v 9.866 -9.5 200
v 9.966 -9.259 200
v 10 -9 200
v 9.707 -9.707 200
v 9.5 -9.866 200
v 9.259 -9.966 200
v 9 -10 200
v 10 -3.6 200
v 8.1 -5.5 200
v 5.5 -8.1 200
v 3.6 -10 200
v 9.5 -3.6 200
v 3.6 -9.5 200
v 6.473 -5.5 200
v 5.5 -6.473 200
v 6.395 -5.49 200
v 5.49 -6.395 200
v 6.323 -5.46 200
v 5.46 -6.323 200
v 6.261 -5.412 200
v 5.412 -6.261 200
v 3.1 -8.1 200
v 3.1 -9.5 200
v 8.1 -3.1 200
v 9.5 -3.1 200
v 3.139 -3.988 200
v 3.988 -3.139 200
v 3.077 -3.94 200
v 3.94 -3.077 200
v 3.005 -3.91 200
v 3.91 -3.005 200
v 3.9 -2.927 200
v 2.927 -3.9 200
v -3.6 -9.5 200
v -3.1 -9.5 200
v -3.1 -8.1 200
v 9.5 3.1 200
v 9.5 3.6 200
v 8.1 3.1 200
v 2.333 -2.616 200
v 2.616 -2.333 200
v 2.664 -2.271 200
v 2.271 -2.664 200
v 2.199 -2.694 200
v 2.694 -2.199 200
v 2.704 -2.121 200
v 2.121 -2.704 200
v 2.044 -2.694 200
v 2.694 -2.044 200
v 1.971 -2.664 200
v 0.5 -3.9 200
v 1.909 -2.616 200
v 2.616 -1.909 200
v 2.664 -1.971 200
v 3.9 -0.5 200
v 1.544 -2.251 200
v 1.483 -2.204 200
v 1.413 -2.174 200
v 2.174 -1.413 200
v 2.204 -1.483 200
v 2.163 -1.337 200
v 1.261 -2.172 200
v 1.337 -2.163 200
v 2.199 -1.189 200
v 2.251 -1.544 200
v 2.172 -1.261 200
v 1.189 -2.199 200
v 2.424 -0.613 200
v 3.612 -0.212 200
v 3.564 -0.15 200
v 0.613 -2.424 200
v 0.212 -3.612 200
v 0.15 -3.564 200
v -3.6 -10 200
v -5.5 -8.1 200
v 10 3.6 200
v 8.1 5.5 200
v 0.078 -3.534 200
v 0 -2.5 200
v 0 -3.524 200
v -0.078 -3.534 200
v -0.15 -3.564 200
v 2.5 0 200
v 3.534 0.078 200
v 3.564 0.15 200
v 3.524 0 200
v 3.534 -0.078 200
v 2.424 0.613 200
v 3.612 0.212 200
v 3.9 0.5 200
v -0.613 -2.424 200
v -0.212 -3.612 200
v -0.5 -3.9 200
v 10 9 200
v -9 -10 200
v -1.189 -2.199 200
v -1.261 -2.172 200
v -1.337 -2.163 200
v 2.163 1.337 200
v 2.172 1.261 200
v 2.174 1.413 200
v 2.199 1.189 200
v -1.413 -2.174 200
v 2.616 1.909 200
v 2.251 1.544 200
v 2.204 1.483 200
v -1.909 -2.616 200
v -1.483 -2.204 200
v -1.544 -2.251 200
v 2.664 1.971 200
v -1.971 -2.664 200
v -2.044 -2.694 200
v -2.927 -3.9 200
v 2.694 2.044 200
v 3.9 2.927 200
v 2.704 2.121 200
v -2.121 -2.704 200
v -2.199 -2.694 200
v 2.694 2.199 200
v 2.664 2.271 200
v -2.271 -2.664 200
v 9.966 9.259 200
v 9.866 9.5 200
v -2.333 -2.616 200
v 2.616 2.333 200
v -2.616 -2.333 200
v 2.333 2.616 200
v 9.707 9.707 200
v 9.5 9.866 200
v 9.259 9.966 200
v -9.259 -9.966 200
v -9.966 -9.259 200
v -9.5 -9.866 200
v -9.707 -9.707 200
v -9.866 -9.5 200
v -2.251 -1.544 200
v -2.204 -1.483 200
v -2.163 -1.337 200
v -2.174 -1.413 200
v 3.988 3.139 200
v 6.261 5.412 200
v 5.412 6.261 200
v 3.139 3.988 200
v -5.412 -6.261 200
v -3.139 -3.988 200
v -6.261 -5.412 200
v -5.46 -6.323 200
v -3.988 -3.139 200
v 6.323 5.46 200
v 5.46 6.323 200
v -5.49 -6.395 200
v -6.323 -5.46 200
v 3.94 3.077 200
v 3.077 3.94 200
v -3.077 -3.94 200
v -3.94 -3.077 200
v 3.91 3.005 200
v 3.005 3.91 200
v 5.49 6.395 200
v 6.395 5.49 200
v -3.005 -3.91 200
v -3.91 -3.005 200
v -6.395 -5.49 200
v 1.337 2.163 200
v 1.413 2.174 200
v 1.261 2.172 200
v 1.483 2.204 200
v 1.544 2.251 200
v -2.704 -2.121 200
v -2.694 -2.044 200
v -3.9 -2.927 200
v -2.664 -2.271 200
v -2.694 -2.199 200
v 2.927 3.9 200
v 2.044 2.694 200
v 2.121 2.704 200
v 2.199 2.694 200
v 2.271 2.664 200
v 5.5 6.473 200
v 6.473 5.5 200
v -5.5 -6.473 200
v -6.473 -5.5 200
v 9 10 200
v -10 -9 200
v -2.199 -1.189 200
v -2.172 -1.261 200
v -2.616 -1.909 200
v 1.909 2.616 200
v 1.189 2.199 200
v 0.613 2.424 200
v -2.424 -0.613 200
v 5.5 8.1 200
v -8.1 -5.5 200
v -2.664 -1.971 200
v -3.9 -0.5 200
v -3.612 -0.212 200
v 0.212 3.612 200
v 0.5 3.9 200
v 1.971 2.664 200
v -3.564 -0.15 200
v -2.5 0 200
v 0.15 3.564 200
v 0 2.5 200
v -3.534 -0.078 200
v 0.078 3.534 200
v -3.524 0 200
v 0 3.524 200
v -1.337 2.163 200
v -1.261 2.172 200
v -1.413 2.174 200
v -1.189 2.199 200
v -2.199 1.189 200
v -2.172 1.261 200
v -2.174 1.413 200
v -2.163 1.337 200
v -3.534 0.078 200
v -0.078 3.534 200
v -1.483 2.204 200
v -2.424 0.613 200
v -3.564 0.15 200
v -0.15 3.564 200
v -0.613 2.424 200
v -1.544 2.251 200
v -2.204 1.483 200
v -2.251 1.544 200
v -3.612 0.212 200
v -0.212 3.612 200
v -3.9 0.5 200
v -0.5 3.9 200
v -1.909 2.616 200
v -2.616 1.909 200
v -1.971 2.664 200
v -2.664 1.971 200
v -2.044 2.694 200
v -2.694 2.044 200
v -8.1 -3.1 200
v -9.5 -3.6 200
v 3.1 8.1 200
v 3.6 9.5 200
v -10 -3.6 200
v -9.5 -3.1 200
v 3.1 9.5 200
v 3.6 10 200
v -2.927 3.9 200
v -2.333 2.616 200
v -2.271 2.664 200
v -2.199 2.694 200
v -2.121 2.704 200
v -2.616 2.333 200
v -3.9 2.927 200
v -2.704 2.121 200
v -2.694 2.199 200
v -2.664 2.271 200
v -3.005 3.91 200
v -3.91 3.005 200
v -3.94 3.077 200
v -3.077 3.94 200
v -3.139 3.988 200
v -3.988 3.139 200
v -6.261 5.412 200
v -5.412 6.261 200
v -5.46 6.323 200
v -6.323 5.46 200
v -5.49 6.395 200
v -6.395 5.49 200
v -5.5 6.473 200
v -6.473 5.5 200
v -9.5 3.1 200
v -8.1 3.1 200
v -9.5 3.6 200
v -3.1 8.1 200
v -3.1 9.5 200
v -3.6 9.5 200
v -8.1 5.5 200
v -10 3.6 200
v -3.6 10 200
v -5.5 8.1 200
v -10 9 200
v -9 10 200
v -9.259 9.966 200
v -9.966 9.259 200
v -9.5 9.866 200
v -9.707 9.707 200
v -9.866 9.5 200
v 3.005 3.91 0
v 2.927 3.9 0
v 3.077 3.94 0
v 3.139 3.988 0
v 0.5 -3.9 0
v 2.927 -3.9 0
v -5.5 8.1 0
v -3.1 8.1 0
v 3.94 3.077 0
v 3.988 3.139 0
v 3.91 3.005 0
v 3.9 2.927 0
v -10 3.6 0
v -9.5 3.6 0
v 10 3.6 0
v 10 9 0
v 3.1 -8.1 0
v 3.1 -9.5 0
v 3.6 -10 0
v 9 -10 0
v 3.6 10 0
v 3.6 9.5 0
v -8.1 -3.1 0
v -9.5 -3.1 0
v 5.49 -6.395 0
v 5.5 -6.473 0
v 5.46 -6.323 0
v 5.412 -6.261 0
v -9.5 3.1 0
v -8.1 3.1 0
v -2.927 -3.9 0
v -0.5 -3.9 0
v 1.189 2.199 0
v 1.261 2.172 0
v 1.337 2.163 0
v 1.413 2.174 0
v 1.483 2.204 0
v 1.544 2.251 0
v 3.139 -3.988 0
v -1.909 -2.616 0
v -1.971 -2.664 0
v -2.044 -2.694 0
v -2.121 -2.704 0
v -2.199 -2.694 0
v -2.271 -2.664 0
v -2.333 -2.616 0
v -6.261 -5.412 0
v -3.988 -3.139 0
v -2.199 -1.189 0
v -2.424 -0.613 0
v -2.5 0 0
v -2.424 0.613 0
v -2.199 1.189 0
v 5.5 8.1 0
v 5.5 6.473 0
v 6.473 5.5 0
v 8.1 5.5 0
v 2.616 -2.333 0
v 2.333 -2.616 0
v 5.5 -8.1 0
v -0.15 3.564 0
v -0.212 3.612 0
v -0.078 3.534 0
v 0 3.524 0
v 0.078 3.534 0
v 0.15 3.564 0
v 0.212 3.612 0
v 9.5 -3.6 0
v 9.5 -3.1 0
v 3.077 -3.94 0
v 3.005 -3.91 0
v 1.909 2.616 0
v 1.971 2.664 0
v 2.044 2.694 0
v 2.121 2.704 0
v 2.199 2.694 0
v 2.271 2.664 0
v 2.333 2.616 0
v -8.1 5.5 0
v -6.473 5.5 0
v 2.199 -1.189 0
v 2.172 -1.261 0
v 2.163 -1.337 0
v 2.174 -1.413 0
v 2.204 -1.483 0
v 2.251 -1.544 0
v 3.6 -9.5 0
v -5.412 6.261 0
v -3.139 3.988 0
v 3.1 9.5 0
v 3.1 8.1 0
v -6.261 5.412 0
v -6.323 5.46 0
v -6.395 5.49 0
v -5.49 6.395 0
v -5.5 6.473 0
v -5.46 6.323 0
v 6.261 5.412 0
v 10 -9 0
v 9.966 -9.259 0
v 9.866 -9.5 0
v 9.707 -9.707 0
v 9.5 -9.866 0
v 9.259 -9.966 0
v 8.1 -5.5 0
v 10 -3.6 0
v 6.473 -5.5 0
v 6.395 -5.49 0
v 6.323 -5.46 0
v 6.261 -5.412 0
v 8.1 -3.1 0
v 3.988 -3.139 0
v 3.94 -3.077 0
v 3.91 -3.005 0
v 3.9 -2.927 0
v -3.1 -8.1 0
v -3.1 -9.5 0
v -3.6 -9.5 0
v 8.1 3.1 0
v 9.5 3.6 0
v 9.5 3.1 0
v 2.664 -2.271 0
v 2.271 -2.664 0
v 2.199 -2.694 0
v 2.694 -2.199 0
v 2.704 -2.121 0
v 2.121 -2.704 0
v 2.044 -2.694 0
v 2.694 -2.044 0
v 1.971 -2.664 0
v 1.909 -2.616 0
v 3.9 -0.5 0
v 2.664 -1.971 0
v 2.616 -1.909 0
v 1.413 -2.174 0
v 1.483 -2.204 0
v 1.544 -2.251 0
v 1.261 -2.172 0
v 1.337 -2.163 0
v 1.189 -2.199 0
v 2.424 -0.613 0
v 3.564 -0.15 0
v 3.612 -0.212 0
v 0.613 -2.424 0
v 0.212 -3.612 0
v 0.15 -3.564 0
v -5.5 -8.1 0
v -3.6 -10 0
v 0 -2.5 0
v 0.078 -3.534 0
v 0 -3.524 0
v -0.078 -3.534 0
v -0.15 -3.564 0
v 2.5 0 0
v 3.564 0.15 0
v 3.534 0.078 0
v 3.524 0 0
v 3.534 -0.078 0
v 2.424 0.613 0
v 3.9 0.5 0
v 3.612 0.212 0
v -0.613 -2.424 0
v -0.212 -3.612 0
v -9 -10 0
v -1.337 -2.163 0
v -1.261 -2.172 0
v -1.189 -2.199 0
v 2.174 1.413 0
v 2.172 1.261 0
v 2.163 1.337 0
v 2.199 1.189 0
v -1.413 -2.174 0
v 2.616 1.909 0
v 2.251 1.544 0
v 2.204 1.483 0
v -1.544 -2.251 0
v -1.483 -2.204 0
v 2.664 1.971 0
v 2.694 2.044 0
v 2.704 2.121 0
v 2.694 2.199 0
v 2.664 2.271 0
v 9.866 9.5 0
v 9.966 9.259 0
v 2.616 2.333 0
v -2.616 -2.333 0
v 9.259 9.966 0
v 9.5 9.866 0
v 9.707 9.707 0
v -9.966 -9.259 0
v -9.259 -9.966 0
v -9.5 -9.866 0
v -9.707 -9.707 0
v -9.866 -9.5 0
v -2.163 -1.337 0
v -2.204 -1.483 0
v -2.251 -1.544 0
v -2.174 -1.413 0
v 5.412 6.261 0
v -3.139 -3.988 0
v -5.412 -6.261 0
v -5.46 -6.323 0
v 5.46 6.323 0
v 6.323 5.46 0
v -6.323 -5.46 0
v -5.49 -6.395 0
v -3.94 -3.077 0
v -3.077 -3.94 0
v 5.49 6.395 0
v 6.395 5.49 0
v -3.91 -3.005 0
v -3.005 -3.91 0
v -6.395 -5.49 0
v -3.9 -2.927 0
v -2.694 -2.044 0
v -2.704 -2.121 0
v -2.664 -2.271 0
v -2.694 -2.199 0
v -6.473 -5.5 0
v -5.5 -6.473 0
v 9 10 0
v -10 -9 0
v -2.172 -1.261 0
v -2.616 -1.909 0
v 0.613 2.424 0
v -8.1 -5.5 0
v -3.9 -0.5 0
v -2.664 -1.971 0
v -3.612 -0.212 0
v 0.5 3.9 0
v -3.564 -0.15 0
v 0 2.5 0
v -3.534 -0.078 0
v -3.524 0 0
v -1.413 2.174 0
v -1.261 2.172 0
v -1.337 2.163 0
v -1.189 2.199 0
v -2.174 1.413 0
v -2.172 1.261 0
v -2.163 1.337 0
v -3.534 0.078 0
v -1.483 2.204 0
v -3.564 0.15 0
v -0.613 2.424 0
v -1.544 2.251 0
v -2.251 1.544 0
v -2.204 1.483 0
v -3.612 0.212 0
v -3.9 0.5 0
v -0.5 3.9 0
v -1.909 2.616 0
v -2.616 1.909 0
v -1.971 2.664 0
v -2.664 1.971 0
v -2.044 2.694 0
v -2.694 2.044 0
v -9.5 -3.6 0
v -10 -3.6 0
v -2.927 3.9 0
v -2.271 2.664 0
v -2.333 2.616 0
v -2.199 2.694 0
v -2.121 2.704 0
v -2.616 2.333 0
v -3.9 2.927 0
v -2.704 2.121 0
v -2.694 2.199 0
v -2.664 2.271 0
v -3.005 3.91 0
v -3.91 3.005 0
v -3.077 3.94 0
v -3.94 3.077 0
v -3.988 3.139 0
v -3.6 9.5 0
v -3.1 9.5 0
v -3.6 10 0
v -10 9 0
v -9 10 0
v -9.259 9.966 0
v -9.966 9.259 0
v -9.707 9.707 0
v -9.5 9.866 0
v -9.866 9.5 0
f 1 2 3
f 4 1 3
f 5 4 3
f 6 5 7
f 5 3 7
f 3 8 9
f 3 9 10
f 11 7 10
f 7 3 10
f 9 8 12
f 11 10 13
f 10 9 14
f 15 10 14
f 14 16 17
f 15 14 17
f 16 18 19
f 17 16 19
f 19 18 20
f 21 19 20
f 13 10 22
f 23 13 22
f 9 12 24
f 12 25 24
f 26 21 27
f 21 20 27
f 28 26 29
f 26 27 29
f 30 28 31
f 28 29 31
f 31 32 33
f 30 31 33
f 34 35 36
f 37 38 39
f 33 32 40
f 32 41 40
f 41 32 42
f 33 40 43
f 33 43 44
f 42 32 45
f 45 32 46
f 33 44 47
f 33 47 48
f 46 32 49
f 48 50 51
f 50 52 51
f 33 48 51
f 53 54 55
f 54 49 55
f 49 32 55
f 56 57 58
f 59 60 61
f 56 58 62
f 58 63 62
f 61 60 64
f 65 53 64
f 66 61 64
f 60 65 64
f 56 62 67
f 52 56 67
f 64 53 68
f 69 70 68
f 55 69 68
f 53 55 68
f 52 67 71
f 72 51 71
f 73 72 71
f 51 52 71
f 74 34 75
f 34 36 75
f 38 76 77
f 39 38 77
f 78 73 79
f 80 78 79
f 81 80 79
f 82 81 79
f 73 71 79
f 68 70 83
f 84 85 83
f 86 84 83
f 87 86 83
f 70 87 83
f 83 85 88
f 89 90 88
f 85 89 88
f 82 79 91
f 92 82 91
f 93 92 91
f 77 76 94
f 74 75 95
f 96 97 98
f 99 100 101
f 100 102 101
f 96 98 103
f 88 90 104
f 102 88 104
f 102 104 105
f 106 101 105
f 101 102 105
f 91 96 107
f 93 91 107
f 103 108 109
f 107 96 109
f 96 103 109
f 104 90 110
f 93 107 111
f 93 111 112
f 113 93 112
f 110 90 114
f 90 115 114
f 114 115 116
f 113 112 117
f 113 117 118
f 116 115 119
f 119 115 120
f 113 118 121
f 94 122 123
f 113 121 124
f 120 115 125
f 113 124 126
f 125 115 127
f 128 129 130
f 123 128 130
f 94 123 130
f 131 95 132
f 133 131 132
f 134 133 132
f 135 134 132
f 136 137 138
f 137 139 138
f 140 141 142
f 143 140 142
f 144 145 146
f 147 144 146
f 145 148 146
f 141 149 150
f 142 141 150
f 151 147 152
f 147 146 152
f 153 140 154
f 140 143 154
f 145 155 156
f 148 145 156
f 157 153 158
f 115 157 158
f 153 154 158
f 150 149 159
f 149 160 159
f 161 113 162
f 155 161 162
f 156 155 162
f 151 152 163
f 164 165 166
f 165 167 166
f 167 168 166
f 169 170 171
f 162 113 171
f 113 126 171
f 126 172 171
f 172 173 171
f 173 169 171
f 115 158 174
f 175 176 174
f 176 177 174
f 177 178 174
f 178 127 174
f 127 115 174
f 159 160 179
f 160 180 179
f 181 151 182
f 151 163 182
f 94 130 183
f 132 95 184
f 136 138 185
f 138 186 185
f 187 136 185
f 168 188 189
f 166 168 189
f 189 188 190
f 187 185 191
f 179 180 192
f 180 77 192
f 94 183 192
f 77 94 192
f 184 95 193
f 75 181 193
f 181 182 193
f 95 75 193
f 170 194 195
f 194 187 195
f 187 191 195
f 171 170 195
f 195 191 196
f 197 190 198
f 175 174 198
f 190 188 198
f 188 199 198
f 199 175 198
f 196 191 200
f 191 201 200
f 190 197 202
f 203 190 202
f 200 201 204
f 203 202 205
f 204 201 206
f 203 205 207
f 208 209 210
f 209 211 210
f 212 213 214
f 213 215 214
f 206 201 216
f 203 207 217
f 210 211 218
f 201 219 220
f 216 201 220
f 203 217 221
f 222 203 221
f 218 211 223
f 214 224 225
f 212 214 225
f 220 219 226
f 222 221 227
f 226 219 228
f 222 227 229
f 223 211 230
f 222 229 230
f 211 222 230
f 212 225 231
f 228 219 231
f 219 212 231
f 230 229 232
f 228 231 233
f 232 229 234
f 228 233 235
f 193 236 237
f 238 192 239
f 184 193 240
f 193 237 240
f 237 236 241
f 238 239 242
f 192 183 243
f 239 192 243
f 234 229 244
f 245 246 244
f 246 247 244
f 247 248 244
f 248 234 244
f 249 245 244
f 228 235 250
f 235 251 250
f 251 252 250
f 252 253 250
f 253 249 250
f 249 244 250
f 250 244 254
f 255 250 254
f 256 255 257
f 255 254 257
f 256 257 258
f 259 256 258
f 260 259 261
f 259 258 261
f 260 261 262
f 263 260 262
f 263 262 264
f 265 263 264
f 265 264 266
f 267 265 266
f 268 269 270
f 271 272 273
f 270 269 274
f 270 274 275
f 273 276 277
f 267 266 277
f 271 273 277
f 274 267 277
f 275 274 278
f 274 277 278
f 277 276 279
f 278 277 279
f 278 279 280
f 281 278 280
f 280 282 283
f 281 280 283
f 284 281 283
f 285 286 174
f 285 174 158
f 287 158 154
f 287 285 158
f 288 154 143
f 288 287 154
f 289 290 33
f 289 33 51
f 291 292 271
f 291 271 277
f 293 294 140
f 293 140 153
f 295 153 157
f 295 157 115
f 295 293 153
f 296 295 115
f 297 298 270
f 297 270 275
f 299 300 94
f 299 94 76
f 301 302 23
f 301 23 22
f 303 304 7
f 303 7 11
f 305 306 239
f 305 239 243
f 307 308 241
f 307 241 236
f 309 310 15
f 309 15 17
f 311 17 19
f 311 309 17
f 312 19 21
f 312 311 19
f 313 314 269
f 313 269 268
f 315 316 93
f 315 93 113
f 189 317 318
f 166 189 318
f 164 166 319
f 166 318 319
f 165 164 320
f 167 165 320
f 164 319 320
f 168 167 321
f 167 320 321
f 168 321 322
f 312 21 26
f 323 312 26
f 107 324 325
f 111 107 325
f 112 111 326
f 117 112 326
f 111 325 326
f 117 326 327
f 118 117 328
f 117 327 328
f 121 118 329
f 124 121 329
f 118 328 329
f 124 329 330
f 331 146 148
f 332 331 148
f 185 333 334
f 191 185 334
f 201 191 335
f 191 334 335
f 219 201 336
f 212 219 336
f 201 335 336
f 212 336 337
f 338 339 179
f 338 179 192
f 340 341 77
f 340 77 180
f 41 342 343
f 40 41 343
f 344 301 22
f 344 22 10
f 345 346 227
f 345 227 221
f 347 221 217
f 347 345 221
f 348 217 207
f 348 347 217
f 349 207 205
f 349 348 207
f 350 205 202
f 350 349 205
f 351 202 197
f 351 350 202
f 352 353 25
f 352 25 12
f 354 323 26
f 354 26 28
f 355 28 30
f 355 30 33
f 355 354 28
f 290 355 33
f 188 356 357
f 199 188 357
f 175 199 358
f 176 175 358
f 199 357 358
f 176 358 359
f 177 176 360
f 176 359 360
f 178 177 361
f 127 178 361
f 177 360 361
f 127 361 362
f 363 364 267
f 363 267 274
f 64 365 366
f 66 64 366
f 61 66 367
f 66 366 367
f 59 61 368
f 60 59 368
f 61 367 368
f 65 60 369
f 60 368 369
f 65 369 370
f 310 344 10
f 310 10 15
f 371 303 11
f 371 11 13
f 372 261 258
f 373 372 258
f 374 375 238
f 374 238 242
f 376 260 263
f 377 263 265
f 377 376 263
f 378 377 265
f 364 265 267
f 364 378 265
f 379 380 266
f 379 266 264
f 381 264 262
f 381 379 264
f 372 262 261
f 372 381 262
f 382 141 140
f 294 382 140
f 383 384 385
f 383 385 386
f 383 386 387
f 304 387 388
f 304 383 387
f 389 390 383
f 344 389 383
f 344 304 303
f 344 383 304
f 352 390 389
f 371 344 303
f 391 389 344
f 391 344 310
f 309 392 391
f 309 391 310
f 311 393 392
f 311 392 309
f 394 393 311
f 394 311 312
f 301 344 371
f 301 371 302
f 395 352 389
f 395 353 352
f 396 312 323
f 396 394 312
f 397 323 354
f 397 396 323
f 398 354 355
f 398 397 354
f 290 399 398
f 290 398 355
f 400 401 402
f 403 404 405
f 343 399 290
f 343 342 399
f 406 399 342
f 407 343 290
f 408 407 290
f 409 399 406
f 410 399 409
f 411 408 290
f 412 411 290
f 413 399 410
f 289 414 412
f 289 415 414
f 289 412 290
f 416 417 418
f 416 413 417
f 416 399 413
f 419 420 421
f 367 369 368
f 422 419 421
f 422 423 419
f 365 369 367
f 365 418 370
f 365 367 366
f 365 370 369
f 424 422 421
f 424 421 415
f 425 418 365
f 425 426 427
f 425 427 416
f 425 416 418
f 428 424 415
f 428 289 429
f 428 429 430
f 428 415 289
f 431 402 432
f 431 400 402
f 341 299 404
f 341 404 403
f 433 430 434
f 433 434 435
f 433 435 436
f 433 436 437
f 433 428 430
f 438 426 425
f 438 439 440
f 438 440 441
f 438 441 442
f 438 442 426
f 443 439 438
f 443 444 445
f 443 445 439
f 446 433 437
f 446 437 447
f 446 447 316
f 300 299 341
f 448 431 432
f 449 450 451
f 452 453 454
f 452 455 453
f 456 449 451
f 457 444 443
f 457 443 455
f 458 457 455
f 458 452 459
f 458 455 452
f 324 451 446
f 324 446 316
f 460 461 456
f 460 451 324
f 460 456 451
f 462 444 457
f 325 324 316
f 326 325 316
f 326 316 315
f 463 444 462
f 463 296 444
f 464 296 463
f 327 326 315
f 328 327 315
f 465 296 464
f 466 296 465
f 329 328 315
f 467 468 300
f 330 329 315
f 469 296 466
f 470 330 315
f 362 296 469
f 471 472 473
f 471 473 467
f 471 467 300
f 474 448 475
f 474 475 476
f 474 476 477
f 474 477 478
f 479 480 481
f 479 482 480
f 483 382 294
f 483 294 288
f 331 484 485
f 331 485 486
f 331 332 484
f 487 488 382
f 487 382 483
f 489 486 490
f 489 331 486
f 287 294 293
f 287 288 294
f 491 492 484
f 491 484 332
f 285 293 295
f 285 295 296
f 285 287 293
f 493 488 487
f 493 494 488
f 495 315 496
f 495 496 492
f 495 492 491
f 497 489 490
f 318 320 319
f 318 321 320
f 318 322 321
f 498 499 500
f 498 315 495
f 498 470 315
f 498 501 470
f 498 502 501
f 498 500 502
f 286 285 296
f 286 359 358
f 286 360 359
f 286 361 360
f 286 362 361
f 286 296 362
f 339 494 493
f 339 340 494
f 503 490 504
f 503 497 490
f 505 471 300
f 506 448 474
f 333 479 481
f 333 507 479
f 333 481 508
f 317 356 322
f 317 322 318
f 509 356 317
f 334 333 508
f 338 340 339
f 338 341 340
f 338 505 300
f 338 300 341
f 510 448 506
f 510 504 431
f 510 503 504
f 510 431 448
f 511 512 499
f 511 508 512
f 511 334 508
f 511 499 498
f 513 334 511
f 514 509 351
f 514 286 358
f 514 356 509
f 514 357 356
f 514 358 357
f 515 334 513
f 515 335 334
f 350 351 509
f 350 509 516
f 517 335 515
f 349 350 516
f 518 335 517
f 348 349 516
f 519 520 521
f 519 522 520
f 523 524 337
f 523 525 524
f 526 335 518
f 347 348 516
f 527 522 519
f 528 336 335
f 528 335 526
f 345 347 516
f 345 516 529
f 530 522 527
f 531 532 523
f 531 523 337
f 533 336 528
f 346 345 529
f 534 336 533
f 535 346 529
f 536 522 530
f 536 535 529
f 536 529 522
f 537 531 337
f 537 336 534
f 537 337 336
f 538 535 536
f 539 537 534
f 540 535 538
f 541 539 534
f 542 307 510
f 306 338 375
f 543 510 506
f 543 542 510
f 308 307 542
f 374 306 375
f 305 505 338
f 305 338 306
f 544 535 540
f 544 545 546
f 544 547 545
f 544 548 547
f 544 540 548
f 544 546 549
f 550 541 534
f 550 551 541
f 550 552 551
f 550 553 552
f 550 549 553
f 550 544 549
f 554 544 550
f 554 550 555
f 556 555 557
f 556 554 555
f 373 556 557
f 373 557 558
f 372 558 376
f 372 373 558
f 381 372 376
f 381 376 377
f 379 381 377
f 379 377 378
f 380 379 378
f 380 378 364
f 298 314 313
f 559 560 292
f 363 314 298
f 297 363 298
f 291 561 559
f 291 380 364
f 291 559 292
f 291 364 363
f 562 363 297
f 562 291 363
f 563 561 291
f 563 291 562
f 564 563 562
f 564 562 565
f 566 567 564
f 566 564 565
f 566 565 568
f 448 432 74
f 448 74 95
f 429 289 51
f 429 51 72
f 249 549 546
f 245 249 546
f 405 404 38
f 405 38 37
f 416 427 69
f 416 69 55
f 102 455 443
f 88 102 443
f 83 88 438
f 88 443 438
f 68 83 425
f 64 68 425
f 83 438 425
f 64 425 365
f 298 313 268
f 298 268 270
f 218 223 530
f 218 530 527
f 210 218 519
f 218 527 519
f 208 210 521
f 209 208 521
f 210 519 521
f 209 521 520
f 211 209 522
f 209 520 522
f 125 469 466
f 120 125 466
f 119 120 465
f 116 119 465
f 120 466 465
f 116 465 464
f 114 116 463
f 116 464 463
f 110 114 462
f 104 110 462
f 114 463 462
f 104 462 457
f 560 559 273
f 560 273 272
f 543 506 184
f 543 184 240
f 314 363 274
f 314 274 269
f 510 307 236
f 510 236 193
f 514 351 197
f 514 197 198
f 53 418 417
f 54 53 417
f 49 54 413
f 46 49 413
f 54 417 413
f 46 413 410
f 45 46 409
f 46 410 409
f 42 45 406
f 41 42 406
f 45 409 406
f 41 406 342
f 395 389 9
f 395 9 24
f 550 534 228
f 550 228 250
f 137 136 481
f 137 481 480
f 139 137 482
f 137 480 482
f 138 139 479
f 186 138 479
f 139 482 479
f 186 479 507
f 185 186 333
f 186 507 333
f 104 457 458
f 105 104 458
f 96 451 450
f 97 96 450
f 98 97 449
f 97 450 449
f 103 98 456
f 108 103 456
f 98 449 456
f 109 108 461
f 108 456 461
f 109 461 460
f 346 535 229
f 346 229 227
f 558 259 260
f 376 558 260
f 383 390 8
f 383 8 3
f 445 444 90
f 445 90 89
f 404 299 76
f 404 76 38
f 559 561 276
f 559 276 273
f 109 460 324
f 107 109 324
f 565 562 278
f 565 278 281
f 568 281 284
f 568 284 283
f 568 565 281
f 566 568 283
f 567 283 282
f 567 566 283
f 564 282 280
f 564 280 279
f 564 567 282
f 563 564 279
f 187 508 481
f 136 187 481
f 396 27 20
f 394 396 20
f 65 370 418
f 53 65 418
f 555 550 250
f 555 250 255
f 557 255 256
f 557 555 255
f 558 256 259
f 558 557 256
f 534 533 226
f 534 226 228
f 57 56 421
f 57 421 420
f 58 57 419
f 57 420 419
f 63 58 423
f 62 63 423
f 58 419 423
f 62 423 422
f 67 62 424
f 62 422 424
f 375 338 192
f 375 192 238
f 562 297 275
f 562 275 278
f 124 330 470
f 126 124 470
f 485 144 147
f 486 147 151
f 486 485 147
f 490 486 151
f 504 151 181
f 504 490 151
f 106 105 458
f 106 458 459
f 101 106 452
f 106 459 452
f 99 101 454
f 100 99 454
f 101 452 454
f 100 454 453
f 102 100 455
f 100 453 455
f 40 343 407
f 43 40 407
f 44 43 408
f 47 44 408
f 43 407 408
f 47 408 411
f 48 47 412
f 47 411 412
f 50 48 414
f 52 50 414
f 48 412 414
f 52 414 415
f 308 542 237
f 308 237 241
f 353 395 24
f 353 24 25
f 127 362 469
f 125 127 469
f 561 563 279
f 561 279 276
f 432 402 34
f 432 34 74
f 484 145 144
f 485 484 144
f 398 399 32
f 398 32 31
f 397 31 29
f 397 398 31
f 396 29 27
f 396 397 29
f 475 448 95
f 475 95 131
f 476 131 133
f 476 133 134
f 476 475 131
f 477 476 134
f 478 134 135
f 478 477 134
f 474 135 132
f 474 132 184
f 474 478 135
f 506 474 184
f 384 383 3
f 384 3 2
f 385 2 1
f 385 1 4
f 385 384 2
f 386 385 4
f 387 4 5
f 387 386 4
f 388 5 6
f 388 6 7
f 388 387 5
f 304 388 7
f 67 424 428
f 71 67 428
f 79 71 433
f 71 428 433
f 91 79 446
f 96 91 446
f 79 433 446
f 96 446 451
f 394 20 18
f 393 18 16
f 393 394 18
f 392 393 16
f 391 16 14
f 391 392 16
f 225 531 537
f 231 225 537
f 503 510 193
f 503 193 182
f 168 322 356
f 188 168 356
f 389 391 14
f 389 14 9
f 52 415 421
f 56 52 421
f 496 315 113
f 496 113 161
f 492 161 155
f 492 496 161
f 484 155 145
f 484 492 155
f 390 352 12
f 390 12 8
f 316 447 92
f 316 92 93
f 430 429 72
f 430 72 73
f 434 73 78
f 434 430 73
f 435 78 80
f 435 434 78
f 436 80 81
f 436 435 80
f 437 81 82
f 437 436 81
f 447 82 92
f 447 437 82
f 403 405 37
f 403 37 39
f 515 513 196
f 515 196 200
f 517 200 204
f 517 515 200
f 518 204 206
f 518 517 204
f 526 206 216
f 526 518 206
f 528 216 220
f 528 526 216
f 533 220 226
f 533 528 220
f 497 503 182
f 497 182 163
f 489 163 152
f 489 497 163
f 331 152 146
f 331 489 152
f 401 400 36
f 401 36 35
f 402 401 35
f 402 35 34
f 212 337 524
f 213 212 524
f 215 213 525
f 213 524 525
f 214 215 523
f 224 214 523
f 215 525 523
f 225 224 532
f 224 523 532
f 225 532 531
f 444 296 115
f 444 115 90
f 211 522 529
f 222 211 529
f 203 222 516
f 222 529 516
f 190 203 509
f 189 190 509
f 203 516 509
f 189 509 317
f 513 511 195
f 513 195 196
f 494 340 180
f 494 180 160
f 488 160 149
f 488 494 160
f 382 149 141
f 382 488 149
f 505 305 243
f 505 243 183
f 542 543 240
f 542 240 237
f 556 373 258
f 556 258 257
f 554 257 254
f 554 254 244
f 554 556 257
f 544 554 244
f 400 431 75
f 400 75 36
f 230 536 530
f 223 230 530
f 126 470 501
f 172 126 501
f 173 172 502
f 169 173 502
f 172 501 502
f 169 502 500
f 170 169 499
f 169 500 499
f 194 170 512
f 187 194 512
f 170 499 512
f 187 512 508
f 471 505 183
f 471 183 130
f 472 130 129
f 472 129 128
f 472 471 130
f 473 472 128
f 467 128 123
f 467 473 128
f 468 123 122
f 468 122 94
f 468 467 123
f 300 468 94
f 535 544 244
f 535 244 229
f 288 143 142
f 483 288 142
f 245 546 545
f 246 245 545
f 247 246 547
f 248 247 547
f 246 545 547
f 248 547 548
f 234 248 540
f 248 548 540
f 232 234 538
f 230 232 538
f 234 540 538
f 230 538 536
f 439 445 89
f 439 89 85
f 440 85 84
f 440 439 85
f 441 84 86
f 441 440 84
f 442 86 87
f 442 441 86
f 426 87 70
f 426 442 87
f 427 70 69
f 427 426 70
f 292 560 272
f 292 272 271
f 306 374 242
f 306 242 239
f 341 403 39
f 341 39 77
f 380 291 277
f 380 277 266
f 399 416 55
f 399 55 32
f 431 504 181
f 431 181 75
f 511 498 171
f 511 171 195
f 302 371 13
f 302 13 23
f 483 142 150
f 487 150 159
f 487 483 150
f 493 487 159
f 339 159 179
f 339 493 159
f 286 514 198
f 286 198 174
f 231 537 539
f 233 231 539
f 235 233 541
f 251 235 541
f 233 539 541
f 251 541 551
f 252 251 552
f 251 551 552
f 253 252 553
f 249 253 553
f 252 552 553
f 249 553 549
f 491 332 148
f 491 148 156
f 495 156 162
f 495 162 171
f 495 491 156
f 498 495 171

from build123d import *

# Parameters (mm, degrees)
EXTRUDE_1_DEPTH = 200


with BuildPart() as part:
    # Эскиз2 → Бобышка-Вытянуть1 (new body)
    with BuildSketch(Plane.XY):
        with BuildLine():
            Line((3.9, -0.5), (3.9, -2.927207794))
            ThreePointArc((3.9, -2.927207794), (3.92283614, -3.042012824), (3.987867966, -3.139339828))
            Line((3.987867966, -3.139339828), (6.260660172, -5.412132034))
            ThreePointArc((6.260660172, -5.412132034), (6.357987176, -5.47716386), (6.472792206, -5.5))
            Line((6.472792206, -5.5), (8.1, -5.5))
            Line((8.1, -5.5), (8.1, -3.1))
            Line((8.1, -3.1), (9.5, -3.1))
            Line((9.5, -3.1), (9.5, -3.6))
            Line((9.5, -3.6), (10, -3.6))
            Line((10, -3.6), (10, -9))
            ThreePointArc((10, -9), (9.707106781, -9.707106781), (9, -10))
            Line((9, -10), (3.6, -10))
            Line((3.6, -10), (3.6, -9.5))
            Line((3.6, -9.5), (3.1, -9.5))
            Line((3.1, -9.5), (3.1, -8.1))
            Line((3.1, -8.1), (5.5, -8.1))
            Line((5.5, -8.1), (5.5, -6.472792206))
            ThreePointArc((5.5, -6.472792206), (5.47716386, -6.357987176), (5.412132034, -6.260660172))
            Line((5.412132034, -6.260660172), (3.139339828, -3.987867966))
            ThreePointArc((3.139339828, -3.987867966), (3.042012824, -3.92283614), (2.927207794, -3.9))
            Line((2.927207794, -3.9), (0.5, -3.9))
            Line((0.5, -3.9), (0.212132034, -3.612132034))
            ThreePointArc((0.212132034, -3.612132034), (0, -3.524264069), (-0.212132034, -3.612132034))
            Line((-0.212132034, -3.612132034), (-0.5, -3.9))
            Line((-0.5, -3.9), (-2.927207794, -3.9))
            ThreePointArc((-2.927207794, -3.9), (-3.042012824, -3.92283614), (-3.139339828, -3.987867966))
            Line((-3.139339828, -3.987867966), (-5.412132034, -6.260660172))
            ThreePointArc((-5.412132034, -6.260660172), (-5.47716386, -6.357987176), (-5.5, -6.472792206))
            Line((-5.5, -6.472792206), (-5.5, -8.1))
            Line((-5.5, -8.1), (-3.1, -8.1))
            Line((-3.1, -8.1), (-3.1, -9.5))
            Line((-3.1, -9.5), (-3.6, -9.5))
            Line((-3.6, -9.5), (-3.6, -10))
            Line((-3.6, -10), (-9, -10))
            ThreePointArc((-9, -10), (-9.707106781, -9.707106781), (-10, -9))
            Line((-10, -9), (-10, -3.6))
            Line((-10, -3.6), (-9.5, -3.6))
            Line((-9.5, -3.6), (-9.5, -3.1))
            Line((-9.5, -3.1), (-8.1, -3.1))
            Line((-8.1, -3.1), (-8.1, -5.5))
            Line((-8.1, -5.5), (-6.472792206, -5.5))
            ThreePointArc((-6.472792206, -5.5), (-6.357987176, -5.47716386), (-6.260660172, -5.412132034))
            Line((-6.260660172, -5.412132034), (-3.987867966, -3.139339828))
            ThreePointArc((-3.987867966, -3.139339828), (-3.92283614, -3.042012824), (-3.9, -2.927207794))
            Line((-3.9, -2.927207794), (-3.9, -0.5))
            Line((-3.9, -0.5), (-3.612132034, -0.212132034))
            ThreePointArc((-3.612132034, -0.212132034), (-3.524264069, 0), (-3.612132034, 0.212132034))
            Line((-3.612132034, 0.212132034), (-3.9, 0.5))
            Line((-3.9, 0.5), (-3.9, 2.927207794))
            ThreePointArc((-3.9, 2.927207794), (-3.92283614, 3.042012824), (-3.987867966, 3.139339828))
            Line((-3.987867966, 3.139339828), (-6.260660172, 5.412132034))
            ThreePointArc((-6.260660172, 5.412132034), (-6.357987176, 5.47716386), (-6.472792206, 5.5))
            Line((-6.472792206, 5.5), (-8.1, 5.5))
            Line((-8.1, 5.5), (-8.1, 3.1))
            Line((-8.1, 3.1), (-9.5, 3.1))
            Line((-9.5, 3.1), (-9.5, 3.6))
            Line((-9.5, 3.6), (-10, 3.6))
            Line((-10, 3.6), (-10, 9))
            ThreePointArc((-10, 9), (-9.707106781, 9.707106781), (-9, 10))
            Line((-9, 10), (-3.6, 10))
            Line((-3.6, 10), (-3.6, 9.5))
            Line((-3.6, 9.5), (-3.1, 9.5))
            Line((-3.1, 9.5), (-3.1, 8.1))
            Line((-3.1, 8.1), (-5.5, 8.1))
            Line((-5.5, 8.1), (-5.5, 6.472792206))
            ThreePointArc((-5.5, 6.472792206), (-5.47716386, 6.357987176), (-5.412132034, 6.260660172))
            Line((-5.412132034, 6.260660172), (-3.139339828, 3.987867966))
            ThreePointArc((-3.139339828, 3.987867966), (-3.042012824, 3.92283614), (-2.927207794, 3.9))
            Line((-2.927207794, 3.9), (-0.5, 3.9))
            Line((-0.5, 3.9), (-0.212132034, 3.612132034))
            ThreePointArc((-0.212132034, 3.612132034), (0, 3.524264069), (0.212132034, 3.612132034))
            Line((0.212132034, 3.612132034), (0.5, 3.9))
            Line((0.5, 3.9), (2.927207794, 3.9))
            ThreePointArc((2.927207794, 3.9), (3.042012824, 3.92283614), (3.139339828, 3.987867966))
            Line((3.139339828, 3.987867966), (5.412132034, 6.260660172))
            ThreePointArc((5.412132034, 6.260660172), (5.47716386, 6.357987176), (5.5, 6.472792206))
            Line((5.5, 6.472792206), (5.5, 8.1))
            Line((5.5, 8.1), (3.1, 8.1))
            Line((3.1, 8.1), (3.1, 9.5))
            Line((3.1, 9.5), (3.6, 9.5))
            Line((3.6, 9.5), (3.6, 10))
            Line((3.6, 10), (9, 10))
            ThreePointArc((9, 10), (9.707106781, 9.707106781), (10, 9))
            Line((10, 9), (10, 3.6))
            Line((10, 3.6), (9.5, 3.6))
            Line((9.5, 3.6), (9.5, 3.1))
            Line((9.5, 3.1), (8.1, 3.1))
            Line((8.1, 3.1), (8.1, 5.5))
            Line((8.1, 5.5), (6.472792206, 5.5))
            ThreePointArc((6.472792206, 5.5), (6.357987176, 5.47716386), (6.260660172, 5.412132034))
            Line((6.260660172, 5.412132034), (3.987867966, 3.139339828))
            ThreePointArc((3.987867966, 3.139339828), (3.92283614, 3.042012824), (3.9, 2.927207794))
            Line((3.9, 2.927207794), (3.9, 0.5))
            Line((3.9, 0.5), (3.612132034, 0.212132034))
            ThreePointArc((3.612132034, 0.212132034), (3.524264069, 0), (3.612132034, -0.212132034))
            Line((3.612132034, -0.212132034), (3.9, -0.5))
        make_face()
        with BuildLine():
            Line((-1.909188309, 2.61629509), (-1.543813206, 2.250919987))
            ThreePointArc((-1.543813206, 2.250919987), (-1.374992046, 2.16619487), (-1.189001046, 2.19915359))
            ThreePointArc((-1.189001046, 2.19915359), (0, 2.5), (1.189001046, 2.19915359))
            ThreePointArc((1.189001046, 2.19915359), (1.374992046, 2.16619487), (1.543813206, 2.250919987))
            Line((1.543813206, 2.250919987), (1.909188309, 2.61629509))
            ThreePointArc((1.909188309, 2.61629509), (2.121320344, 2.704163056), (2.333452378, 2.61629509))
            Line((2.333452378, 2.61629509), (2.61629509, 2.333452378))
            ThreePointArc((2.61629509, 2.333452378), (2.704163056, 2.121320344), (2.61629509, 1.909188309))
            Line((2.61629509, 1.909188309), (2.250919987, 1.543813206))
            ThreePointArc((2.250919987, 1.543813206), (2.16619487, 1.374992046), (2.19915359, 1.189001046))
            ThreePointArc((2.19915359, 1.189001046), (2.5, 0), (2.19915359, -1.189001046))
            ThreePointArc((2.19915359, -1.189001046), (2.16619487, -1.374992046), (2.250919987, -1.543813206))
            Line((2.250919987, -1.543813206), (2.61629509, -1.909188309))
            ThreePointArc((2.61629509, -1.909188309), (2.704163056, -2.121320344), (2.61629509, -2.333452378))
            Line((2.61629509, -2.333452378), (2.333452378, -2.61629509))
            ThreePointArc((2.333452378, -2.61629509), (2.121320344, -2.704163056), (1.909188309, -2.61629509))
            Line((1.909188309, -2.61629509), (1.543813206, -2.250919987))
            ThreePointArc((1.543813206, -2.250919987), (1.374992046, -2.16619487), (1.189001046, -2.19915359))
            ThreePointArc((1.189001046, -2.19915359), (0, -2.5), (-1.189001046, -2.19915359))
            ThreePointArc((-1.189001046, -2.19915359), (-1.374992046, -2.16619487), (-1.543813206, -2.250919987))
            Line((-1.543813206, -2.250919987), (-1.909188309, -2.61629509))
            ThreePointArc((-1.909188309, -2.61629509), (-2.121320344, -2.704163056), (-2.333452378, -2.61629509))
            Line((-2.333452378, -2.61629509), (-2.61629509, -2.333452378))
            ThreePointArc((-2.61629509, -2.333452378), (-2.704163056, -2.121320344), (-2.61629509, -1.909188309))
            Line((-2.61629509, -1.909188309), (-2.250919987, -1.543813206))
            ThreePointArc((-2.250919987, -1.543813206), (-2.16619487, -1.374992046), (-2.19915359, -1.189001046))
            ThreePointArc((-2.19915359, -1.189001046), (-2.5, 0), (-2.19915359, 1.189001046))
            ThreePointArc((-2.19915359, 1.189001046), (-2.16619487, 1.374992046), (-2.250919987, 1.543813206))
            Line((-2.250919987, 1.543813206), (-2.61629509, 1.909188309))
            ThreePointArc((-2.61629509, 1.909188309), (-2.704163056, 2.121320344), (-2.61629509, 2.333452378))
            Line((-2.61629509, 2.333452378), (-2.333452378, 2.61629509))
            ThreePointArc((-2.333452378, 2.61629509), (-2.121320344, 2.704163056), (-1.909188309, 2.61629509))
        make_face(mode=Mode.SUBTRACT)
    extrude(amount=EXTRUDE_1_DEPTH)


solid = part.part
